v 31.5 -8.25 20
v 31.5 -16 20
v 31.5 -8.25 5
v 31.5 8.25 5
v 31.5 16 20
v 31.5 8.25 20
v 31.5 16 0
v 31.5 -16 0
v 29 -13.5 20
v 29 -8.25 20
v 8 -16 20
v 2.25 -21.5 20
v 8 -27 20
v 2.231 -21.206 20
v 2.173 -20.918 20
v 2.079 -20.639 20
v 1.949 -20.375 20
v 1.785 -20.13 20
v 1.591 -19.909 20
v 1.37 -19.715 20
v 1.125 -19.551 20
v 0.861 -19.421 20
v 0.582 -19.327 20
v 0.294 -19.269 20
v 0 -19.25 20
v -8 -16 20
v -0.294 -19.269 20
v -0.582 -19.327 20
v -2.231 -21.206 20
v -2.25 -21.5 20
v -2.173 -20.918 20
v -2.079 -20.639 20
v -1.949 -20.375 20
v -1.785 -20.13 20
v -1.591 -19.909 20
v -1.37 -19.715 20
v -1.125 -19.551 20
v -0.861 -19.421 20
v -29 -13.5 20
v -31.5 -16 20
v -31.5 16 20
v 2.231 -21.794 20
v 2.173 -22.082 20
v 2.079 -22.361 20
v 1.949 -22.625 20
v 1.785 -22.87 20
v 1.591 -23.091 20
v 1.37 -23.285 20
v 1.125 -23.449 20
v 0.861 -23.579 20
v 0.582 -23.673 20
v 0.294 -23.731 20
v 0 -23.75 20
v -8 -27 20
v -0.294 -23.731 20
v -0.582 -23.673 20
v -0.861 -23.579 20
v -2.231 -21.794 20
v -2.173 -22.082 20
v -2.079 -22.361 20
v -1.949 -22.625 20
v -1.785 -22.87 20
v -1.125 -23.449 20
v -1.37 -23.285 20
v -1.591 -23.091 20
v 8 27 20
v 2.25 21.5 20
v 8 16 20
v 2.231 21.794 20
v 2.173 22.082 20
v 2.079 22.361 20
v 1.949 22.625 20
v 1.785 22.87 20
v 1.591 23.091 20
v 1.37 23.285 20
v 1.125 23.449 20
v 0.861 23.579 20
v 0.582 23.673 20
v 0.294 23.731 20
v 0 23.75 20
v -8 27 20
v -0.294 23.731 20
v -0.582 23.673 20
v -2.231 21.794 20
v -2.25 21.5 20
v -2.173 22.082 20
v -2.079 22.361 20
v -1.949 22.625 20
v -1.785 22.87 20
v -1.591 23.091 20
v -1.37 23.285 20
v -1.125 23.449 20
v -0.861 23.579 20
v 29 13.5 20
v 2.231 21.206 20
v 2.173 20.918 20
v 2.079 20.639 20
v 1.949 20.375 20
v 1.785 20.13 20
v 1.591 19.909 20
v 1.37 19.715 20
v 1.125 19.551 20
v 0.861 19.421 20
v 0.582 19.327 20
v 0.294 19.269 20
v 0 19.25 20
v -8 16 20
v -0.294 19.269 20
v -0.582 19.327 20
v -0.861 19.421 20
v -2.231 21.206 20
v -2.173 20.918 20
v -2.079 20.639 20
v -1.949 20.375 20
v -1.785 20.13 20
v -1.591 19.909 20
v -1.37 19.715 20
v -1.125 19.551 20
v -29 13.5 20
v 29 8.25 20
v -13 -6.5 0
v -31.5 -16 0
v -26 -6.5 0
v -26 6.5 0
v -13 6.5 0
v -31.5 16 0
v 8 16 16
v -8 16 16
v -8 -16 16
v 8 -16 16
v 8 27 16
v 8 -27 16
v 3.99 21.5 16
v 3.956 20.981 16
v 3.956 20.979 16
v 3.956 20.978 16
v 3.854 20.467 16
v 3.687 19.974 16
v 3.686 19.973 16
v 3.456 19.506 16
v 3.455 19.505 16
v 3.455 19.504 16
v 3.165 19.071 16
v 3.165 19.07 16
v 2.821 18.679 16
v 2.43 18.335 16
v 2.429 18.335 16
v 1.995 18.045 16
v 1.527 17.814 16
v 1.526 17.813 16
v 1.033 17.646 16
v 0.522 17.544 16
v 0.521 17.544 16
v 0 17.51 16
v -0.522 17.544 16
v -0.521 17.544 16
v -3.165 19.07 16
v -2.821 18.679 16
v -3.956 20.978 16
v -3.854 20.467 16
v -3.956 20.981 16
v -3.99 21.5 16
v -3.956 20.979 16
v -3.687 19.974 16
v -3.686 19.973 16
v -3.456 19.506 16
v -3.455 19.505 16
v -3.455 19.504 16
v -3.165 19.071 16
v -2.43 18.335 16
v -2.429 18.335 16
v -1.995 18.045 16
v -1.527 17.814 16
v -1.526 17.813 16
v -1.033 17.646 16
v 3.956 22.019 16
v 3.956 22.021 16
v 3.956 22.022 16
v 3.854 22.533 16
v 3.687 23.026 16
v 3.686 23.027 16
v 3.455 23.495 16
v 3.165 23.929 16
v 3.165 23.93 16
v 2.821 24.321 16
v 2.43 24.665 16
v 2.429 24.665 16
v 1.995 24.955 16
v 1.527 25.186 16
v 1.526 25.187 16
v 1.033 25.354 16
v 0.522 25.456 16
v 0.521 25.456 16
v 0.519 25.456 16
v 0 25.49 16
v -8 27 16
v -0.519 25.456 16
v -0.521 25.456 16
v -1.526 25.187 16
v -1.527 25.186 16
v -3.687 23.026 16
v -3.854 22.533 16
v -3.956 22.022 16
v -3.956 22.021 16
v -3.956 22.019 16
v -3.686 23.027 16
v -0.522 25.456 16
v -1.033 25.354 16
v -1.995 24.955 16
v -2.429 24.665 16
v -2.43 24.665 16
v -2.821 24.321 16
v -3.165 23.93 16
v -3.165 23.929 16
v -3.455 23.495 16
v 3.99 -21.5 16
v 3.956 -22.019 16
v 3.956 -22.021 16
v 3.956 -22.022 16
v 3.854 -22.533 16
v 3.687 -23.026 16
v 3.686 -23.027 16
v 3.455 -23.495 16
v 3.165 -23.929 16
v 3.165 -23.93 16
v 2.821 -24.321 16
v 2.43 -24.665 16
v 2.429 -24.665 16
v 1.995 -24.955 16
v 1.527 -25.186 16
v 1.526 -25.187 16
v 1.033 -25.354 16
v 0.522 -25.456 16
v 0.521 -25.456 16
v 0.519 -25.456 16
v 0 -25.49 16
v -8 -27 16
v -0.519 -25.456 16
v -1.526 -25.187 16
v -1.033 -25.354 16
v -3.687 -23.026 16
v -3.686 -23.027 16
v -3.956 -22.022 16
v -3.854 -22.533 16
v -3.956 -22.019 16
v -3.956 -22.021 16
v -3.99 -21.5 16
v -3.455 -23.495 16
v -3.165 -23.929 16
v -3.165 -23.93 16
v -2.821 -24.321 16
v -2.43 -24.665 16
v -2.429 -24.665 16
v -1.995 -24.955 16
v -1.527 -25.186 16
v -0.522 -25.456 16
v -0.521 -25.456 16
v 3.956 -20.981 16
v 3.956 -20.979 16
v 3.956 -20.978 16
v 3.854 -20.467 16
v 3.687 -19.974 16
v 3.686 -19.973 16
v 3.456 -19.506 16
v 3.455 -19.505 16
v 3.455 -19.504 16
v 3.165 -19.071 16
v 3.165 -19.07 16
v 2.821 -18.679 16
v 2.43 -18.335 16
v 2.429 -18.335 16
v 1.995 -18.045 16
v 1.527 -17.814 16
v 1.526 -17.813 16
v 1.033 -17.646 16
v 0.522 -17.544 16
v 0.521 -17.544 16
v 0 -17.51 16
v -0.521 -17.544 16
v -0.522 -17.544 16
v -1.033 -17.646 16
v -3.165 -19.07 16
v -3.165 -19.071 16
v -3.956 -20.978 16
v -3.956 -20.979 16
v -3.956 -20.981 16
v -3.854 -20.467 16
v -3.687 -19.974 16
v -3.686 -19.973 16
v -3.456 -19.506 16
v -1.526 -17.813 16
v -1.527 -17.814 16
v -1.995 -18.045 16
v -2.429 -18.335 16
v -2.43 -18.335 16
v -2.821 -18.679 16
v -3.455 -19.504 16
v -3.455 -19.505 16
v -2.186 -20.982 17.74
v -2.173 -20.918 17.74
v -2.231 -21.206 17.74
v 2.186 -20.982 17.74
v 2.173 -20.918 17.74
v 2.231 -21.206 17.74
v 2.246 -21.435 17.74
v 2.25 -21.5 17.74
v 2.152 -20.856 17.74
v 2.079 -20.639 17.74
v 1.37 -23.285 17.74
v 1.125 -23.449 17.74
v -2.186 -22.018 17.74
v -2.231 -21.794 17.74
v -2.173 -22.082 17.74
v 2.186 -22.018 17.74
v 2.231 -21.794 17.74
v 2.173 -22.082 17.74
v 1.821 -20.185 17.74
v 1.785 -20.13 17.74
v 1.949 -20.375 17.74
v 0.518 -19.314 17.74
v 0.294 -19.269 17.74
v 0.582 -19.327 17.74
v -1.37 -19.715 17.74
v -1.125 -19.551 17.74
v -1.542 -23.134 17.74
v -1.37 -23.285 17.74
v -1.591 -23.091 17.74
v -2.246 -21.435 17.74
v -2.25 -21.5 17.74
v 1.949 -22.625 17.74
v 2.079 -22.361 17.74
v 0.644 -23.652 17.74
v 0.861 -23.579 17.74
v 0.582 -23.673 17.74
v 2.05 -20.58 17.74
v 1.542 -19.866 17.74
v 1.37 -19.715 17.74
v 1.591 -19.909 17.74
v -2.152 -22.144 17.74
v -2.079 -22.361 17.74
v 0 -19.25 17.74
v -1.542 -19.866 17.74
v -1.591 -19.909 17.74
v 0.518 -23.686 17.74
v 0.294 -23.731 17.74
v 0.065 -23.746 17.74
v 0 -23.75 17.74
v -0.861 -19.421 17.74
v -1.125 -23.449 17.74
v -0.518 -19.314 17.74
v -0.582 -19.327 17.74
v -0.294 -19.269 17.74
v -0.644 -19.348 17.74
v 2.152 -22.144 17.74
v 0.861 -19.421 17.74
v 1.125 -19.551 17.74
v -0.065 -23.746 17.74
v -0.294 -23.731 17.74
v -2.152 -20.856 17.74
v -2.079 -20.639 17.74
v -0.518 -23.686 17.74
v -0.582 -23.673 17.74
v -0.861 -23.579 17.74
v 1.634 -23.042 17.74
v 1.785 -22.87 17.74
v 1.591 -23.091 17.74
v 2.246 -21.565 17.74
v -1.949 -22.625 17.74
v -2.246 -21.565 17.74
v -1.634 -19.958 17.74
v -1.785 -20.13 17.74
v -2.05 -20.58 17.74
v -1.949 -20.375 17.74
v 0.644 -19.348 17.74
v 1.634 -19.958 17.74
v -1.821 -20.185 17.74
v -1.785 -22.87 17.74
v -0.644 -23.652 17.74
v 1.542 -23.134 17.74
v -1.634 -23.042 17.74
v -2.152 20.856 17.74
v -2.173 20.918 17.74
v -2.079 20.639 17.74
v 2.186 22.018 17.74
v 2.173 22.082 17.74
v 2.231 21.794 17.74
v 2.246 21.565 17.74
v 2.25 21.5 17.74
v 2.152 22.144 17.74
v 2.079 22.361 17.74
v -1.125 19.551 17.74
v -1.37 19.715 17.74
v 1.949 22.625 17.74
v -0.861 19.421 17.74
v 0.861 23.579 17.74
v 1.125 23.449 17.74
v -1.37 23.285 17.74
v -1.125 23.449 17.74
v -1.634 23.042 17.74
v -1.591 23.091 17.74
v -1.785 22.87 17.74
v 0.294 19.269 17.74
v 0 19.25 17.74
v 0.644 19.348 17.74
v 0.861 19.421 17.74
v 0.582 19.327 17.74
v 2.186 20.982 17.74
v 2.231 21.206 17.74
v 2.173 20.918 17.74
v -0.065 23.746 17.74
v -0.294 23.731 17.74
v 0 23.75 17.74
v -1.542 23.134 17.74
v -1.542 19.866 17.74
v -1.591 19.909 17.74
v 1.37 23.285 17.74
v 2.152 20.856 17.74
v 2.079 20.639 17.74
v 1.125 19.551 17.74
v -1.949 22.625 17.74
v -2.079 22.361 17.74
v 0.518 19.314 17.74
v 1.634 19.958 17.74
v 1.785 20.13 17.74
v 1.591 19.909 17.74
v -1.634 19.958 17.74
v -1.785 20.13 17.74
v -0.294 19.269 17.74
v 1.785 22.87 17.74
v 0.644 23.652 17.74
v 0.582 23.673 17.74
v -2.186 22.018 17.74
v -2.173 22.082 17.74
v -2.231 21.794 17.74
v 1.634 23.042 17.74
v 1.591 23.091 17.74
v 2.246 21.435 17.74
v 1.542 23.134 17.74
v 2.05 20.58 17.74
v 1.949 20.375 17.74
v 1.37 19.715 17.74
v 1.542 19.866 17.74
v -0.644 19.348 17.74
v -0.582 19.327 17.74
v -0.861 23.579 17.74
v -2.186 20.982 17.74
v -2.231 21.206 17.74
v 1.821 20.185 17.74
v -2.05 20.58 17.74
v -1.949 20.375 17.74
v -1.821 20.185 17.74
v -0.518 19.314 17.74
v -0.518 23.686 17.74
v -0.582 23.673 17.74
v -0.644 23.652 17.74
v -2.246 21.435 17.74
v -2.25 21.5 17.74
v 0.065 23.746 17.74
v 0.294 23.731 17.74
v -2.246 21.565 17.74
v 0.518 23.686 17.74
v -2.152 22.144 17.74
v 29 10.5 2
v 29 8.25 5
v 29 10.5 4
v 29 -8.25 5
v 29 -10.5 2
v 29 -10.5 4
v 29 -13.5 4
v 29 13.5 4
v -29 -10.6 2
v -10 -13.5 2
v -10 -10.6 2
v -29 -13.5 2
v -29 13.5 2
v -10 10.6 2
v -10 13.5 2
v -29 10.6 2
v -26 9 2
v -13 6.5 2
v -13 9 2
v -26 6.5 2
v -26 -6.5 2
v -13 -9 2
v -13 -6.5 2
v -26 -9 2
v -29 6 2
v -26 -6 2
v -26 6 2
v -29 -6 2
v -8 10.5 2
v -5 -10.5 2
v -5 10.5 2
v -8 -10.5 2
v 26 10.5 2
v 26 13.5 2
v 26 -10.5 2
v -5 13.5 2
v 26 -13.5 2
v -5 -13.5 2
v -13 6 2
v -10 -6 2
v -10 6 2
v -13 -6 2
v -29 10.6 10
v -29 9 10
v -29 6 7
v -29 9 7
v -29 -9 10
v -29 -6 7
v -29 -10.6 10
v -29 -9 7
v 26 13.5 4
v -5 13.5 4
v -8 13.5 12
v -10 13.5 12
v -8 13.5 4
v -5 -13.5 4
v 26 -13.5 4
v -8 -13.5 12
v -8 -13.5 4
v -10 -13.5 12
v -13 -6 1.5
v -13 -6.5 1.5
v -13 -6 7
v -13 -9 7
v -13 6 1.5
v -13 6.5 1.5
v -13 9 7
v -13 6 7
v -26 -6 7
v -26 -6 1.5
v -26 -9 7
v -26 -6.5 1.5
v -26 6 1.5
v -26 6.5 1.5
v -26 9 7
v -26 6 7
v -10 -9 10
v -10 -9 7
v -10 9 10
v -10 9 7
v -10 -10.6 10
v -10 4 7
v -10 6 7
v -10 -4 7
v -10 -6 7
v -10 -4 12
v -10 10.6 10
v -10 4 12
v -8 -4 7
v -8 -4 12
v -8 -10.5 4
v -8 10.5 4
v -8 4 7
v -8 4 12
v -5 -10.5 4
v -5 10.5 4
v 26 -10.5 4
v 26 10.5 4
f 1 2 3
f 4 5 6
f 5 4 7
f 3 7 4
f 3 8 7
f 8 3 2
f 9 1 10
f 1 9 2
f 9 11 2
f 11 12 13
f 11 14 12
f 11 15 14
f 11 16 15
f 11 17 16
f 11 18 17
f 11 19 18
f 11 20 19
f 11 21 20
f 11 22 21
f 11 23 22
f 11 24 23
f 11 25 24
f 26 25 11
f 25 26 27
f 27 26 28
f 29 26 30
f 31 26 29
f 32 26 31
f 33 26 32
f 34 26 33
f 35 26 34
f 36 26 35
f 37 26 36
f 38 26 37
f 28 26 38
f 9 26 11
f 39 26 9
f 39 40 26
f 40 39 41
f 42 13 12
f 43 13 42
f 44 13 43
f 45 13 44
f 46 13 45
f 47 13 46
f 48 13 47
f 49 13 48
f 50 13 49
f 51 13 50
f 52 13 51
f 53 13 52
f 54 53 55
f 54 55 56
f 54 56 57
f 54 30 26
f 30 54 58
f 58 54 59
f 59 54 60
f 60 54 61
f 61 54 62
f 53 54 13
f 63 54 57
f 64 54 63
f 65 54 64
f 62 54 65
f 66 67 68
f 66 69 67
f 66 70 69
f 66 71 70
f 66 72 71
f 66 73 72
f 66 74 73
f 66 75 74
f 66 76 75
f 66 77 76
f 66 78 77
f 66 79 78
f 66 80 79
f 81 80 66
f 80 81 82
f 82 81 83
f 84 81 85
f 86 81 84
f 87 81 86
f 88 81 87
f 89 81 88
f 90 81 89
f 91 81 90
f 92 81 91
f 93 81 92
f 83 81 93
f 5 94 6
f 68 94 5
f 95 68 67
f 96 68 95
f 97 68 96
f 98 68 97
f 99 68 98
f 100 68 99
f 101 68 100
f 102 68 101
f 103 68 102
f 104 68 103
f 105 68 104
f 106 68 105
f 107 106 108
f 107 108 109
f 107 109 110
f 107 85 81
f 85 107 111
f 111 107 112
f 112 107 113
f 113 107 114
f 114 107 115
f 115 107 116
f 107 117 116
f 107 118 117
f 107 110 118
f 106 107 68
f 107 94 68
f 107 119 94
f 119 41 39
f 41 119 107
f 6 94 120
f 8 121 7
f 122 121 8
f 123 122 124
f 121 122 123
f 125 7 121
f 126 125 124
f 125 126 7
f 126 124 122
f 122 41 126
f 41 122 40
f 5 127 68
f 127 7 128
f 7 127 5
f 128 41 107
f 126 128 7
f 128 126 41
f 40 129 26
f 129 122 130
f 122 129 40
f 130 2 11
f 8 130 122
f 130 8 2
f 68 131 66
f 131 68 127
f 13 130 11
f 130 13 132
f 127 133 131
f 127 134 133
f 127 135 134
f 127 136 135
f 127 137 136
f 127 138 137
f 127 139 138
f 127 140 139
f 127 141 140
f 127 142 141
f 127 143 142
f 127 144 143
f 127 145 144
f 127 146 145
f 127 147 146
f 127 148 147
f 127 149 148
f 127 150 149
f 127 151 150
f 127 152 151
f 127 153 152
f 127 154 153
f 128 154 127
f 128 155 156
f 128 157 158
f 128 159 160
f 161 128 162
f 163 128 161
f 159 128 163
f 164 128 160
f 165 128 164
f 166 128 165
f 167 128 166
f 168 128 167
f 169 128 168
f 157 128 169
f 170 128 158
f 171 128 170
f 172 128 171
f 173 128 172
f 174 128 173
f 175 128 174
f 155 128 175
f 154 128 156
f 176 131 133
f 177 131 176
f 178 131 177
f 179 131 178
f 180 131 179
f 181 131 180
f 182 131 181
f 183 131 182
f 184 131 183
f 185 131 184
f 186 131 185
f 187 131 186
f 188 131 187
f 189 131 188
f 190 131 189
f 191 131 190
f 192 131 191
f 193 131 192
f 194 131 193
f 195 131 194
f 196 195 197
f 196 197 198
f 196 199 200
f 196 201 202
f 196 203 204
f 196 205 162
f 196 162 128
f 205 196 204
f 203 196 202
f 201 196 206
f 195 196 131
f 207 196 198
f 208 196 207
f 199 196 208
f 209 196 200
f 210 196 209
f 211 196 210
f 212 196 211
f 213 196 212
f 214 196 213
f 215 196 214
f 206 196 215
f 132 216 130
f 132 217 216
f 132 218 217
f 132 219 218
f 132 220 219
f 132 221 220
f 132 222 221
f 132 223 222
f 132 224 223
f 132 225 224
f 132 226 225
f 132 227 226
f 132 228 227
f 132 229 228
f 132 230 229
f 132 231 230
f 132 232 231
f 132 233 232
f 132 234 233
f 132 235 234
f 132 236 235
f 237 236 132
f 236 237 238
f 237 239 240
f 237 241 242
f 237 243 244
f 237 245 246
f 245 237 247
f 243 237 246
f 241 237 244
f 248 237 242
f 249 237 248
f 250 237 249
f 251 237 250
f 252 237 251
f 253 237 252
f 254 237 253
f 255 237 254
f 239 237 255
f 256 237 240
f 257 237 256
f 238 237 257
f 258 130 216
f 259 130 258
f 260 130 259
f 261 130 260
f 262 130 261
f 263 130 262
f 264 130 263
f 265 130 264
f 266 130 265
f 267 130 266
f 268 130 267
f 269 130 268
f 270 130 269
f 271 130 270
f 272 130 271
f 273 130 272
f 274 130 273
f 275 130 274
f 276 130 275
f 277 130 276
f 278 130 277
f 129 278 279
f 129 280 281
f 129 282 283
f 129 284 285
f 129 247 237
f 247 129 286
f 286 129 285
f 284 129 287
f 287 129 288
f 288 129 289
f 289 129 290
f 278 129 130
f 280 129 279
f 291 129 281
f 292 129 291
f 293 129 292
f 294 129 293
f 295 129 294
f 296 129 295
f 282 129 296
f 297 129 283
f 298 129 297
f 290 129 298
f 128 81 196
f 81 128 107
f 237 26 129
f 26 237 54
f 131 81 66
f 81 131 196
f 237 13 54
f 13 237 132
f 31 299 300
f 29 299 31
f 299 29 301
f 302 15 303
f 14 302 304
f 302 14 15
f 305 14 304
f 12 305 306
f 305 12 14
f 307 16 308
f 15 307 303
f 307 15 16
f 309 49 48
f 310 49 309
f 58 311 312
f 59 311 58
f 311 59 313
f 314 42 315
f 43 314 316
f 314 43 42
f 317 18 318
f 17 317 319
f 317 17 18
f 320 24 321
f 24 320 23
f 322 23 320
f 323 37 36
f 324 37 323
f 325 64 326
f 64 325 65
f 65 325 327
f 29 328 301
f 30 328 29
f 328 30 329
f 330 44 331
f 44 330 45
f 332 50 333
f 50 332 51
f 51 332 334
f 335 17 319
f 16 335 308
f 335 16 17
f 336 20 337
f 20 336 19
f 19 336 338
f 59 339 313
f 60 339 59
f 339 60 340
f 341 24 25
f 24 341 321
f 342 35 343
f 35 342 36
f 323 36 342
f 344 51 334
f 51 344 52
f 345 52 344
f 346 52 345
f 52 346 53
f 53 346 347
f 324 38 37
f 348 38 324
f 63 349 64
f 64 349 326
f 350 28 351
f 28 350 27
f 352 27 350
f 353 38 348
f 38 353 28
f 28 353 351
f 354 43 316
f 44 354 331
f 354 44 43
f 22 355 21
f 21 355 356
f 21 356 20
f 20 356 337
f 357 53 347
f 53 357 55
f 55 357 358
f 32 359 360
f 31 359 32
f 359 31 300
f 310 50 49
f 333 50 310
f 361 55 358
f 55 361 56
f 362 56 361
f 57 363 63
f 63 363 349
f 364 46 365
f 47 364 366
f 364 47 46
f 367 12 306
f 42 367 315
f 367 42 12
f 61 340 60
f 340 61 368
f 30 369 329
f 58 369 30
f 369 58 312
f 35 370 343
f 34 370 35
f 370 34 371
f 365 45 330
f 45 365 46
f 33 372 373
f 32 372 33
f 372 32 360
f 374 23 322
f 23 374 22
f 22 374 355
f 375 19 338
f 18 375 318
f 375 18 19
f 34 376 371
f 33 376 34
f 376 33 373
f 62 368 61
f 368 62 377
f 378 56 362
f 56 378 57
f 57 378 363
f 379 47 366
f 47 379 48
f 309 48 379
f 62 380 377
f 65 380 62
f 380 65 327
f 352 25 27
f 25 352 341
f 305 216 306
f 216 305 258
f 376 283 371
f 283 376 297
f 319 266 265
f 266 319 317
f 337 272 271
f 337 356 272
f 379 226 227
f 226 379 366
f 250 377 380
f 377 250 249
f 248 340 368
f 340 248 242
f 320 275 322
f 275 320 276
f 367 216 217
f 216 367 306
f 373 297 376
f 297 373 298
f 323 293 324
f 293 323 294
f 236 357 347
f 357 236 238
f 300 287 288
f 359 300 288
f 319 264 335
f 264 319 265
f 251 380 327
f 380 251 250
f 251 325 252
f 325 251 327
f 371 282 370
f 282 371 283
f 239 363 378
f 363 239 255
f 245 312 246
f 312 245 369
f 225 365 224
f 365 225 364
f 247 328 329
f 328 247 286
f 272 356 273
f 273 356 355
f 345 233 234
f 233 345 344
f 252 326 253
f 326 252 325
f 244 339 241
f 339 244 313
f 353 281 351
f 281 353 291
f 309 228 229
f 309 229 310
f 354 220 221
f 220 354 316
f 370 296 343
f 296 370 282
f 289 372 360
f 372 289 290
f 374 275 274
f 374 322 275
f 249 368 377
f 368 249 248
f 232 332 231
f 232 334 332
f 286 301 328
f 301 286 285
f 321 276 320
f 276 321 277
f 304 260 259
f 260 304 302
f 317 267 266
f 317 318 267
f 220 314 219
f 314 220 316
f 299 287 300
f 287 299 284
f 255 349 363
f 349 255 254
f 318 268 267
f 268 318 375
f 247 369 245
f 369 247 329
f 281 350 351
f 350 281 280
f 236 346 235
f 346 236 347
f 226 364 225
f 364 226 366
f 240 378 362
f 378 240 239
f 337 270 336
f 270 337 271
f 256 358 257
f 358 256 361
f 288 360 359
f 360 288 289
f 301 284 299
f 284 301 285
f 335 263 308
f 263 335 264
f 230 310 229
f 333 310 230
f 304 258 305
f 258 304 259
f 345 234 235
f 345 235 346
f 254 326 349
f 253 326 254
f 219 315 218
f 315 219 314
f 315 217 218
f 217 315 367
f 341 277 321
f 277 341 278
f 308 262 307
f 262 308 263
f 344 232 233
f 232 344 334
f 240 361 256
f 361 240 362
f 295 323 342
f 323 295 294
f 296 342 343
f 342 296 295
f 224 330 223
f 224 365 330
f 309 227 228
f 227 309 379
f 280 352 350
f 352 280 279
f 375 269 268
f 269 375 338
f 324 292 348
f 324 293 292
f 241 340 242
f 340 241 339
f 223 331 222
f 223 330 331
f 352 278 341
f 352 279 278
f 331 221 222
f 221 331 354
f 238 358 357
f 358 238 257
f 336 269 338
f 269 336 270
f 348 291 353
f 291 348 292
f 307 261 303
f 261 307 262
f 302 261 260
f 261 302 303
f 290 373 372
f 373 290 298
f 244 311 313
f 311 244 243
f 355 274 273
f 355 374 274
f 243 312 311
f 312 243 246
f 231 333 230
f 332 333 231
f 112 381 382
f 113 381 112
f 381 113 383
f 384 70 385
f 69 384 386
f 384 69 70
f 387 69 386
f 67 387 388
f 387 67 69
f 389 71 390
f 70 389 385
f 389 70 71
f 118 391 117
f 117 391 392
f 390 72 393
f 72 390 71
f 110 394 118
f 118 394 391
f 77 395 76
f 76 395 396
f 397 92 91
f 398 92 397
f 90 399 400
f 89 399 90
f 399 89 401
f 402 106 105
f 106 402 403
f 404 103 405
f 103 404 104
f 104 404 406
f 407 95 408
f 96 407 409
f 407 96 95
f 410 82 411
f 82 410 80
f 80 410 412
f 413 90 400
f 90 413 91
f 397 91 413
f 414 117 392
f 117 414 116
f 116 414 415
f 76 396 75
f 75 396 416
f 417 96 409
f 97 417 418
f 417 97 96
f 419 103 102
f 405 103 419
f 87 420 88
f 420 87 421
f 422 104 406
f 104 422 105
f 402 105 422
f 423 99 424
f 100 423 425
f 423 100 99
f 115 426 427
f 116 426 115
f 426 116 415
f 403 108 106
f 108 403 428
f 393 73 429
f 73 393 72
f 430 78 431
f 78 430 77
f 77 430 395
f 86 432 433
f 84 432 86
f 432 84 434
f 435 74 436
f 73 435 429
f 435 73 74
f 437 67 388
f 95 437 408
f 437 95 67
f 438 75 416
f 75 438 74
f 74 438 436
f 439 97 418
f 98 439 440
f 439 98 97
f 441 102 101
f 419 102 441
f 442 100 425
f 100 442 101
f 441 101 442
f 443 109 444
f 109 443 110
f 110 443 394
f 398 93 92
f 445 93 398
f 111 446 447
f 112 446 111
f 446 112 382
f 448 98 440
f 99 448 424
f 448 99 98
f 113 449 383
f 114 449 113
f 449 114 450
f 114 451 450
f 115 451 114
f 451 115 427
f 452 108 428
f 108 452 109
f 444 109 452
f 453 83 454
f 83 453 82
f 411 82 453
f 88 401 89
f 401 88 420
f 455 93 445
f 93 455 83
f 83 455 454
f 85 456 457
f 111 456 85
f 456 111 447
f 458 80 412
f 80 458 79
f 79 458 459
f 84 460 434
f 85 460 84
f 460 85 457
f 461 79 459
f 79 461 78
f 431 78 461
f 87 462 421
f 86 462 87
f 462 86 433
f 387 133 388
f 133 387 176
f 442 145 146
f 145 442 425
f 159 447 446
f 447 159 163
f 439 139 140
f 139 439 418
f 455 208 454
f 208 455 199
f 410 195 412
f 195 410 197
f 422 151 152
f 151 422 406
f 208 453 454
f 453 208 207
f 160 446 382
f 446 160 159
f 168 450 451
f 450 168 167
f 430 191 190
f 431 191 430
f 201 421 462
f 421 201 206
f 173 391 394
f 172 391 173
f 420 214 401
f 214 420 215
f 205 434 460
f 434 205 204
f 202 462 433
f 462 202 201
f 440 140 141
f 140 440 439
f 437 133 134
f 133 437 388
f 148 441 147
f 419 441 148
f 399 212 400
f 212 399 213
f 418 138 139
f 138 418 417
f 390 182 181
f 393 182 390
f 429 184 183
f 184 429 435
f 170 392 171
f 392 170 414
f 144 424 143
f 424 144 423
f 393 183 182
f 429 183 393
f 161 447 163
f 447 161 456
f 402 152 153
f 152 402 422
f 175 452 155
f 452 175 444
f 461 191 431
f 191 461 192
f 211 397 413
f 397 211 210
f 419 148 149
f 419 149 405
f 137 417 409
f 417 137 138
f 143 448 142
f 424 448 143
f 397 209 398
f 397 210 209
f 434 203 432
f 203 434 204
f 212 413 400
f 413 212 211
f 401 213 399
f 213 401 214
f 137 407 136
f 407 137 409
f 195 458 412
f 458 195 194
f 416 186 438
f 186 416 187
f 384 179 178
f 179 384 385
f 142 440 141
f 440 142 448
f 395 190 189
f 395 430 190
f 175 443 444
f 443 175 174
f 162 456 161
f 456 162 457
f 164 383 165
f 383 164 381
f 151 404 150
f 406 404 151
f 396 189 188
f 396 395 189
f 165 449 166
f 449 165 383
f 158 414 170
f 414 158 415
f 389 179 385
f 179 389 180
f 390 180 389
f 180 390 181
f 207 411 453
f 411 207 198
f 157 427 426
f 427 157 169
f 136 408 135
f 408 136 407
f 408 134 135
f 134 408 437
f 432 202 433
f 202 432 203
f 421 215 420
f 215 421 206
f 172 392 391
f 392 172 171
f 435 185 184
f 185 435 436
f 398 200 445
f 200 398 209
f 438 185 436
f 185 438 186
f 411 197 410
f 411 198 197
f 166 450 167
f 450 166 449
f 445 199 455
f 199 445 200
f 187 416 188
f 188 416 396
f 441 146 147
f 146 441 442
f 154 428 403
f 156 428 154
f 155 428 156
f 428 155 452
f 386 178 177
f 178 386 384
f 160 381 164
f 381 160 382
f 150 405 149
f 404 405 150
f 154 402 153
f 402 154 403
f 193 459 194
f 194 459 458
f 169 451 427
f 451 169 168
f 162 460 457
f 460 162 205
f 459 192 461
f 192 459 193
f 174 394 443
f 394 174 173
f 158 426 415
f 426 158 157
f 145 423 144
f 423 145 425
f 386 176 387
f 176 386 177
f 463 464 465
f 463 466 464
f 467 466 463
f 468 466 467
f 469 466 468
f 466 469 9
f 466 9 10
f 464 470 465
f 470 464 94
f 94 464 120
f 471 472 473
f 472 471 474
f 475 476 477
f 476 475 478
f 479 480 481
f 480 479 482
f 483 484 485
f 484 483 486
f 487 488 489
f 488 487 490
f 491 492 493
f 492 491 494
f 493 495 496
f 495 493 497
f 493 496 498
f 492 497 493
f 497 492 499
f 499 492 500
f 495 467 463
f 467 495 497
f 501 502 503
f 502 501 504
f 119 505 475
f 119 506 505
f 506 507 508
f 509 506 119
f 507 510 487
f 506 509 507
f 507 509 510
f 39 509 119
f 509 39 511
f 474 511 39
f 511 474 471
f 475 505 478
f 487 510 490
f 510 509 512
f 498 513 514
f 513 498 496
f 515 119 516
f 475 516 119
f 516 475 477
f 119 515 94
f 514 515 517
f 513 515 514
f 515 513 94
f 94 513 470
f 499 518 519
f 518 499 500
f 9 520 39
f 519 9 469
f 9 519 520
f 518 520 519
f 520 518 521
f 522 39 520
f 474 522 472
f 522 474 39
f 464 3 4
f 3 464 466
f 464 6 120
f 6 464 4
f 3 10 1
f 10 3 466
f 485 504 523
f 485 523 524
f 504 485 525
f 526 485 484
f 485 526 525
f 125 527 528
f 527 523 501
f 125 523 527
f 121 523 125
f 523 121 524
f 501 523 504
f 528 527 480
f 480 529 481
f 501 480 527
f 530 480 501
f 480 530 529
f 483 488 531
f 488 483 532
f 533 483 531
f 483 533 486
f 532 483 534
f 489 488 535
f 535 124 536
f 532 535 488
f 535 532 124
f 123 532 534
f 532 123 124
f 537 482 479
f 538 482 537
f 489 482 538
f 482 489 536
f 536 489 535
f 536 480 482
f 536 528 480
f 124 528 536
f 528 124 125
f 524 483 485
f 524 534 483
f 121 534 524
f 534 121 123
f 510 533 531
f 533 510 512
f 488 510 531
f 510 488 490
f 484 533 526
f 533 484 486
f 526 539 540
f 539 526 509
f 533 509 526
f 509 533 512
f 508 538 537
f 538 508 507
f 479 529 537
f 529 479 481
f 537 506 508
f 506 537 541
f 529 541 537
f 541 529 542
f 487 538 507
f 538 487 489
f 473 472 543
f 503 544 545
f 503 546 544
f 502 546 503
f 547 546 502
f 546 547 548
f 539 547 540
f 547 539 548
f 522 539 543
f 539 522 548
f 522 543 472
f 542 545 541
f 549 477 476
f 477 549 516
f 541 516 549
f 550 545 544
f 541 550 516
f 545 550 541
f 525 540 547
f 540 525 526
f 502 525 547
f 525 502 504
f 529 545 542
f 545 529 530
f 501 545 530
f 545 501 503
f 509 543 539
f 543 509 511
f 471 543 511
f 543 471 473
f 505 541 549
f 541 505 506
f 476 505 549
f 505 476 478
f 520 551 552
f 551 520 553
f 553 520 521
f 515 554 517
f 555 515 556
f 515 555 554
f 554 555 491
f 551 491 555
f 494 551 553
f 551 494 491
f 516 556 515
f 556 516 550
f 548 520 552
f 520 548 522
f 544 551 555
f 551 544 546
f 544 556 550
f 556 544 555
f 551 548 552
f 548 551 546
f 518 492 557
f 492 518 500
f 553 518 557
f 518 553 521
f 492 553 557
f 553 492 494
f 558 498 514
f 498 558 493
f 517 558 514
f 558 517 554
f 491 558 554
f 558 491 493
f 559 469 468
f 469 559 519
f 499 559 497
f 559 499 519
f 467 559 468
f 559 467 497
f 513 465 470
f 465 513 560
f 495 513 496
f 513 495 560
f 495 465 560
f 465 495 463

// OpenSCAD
// Khean & Clean - seat plate (prototype): heat sensor + RJ45 screw-terminal breakout in one printed tray.
// Units mm. Bottom faces the player's lap; the open top screws flat under the rail.
// Board sizes are guesses until the parts arrive: measure and change the numbers below. Not test-rendered.
CLR=0.5; WALL=2.5; FLOOR=2; H=20;
SX=18+2*CLR; SY=17+2*CLR;   // blue GY-AMG8833 board (about 18 x 17 mm)
SEN_UP=5;                   // sensor board rests this high; the chip faces down through the window
WIN=13;                     // window under the sensor
RX=36+2*CLR; RY=26+2*CLR;   // RJ45 breakout board (guess)
RJ_UP=2; JW=16.5; JY0=0;    // pads under the RJ45 board, jack opening width, jack offset across
DIV=2; DIV_H=10; NOTCH=8;   // divider between bays, wire notch
EAR=11; EAR_T=4; SCREW_D=4; CSK_D=8;   // #6 wood screws
IY=max(SY,RY); L=WALL+SX+DIV+RX+WALL; W=IY+2*WALL;
x0=-L/2; sx0=x0+WALL; sx1=sx0+SX; dx1=sx1+DIV; rx1=dx1+RX; scx=(sx0+sx1)/2;
$fn=48;
difference(){
  union(){
    translate([-L/2,-W/2,0]) cube([L,W,H]);
    translate([-8,-W/2-EAR,H-EAR_T]) cube([16,W+2*EAR,EAR_T]);
  }
  translate([sx0,-IY/2,FLOOR]) cube([rx1-sx0,IY,H]);                          // cavity
  translate([rx1-1,JY0-JW/2,FLOOR+RJ_UP+1]) cube([WALL+3,JW,H]);               // jack opening
  translate([scx-WIN/2,-WIN/2,-1]) cube([WIN,WIN,FLOOR+2]);                    // sensor window
  for(ey=[-W/2-EAR/2,W/2+EAR/2]){
    translate([0,ey,H-EAR_T-1]) cylinder(d=SCREW_D+CLR,h=EAR_T+2);
    translate([0,ey,H-EAR_T-0.01]) cylinder(d1=CSK_D,d2=SCREW_D,h=2);
  }
}
for(px=[sx0,sx1-3]) for(py=[-SY/2,SY/2-3]) translate([px,py,FLOOR-0.5]) cube([3,3,SEN_UP+0.5]);   // sensor pads
for(sy=[-1,1]) translate([sx0,sy>0?SY/2:-SY/2-1.6,FLOOR-0.5]) cube([SX,1.6,SEN_UP+3.5]);           // sensor side walls
difference(){ translate([sx1,-IY/2,FLOOR-0.5]) cube([DIV,IY,DIV_H+0.5]);                           // divider
  translate([sx1-1,-NOTCH/2,FLOOR+SEN_UP]) cube([DIV+2,NOTCH,H]); }
for(px=[dx1,rx1-3]) for(py=[-RY/2,RY/2-3]) translate([px,py,FLOOR-0.5]) cube([3,3,RJ_UP+0.5]);   // RJ45 pads
